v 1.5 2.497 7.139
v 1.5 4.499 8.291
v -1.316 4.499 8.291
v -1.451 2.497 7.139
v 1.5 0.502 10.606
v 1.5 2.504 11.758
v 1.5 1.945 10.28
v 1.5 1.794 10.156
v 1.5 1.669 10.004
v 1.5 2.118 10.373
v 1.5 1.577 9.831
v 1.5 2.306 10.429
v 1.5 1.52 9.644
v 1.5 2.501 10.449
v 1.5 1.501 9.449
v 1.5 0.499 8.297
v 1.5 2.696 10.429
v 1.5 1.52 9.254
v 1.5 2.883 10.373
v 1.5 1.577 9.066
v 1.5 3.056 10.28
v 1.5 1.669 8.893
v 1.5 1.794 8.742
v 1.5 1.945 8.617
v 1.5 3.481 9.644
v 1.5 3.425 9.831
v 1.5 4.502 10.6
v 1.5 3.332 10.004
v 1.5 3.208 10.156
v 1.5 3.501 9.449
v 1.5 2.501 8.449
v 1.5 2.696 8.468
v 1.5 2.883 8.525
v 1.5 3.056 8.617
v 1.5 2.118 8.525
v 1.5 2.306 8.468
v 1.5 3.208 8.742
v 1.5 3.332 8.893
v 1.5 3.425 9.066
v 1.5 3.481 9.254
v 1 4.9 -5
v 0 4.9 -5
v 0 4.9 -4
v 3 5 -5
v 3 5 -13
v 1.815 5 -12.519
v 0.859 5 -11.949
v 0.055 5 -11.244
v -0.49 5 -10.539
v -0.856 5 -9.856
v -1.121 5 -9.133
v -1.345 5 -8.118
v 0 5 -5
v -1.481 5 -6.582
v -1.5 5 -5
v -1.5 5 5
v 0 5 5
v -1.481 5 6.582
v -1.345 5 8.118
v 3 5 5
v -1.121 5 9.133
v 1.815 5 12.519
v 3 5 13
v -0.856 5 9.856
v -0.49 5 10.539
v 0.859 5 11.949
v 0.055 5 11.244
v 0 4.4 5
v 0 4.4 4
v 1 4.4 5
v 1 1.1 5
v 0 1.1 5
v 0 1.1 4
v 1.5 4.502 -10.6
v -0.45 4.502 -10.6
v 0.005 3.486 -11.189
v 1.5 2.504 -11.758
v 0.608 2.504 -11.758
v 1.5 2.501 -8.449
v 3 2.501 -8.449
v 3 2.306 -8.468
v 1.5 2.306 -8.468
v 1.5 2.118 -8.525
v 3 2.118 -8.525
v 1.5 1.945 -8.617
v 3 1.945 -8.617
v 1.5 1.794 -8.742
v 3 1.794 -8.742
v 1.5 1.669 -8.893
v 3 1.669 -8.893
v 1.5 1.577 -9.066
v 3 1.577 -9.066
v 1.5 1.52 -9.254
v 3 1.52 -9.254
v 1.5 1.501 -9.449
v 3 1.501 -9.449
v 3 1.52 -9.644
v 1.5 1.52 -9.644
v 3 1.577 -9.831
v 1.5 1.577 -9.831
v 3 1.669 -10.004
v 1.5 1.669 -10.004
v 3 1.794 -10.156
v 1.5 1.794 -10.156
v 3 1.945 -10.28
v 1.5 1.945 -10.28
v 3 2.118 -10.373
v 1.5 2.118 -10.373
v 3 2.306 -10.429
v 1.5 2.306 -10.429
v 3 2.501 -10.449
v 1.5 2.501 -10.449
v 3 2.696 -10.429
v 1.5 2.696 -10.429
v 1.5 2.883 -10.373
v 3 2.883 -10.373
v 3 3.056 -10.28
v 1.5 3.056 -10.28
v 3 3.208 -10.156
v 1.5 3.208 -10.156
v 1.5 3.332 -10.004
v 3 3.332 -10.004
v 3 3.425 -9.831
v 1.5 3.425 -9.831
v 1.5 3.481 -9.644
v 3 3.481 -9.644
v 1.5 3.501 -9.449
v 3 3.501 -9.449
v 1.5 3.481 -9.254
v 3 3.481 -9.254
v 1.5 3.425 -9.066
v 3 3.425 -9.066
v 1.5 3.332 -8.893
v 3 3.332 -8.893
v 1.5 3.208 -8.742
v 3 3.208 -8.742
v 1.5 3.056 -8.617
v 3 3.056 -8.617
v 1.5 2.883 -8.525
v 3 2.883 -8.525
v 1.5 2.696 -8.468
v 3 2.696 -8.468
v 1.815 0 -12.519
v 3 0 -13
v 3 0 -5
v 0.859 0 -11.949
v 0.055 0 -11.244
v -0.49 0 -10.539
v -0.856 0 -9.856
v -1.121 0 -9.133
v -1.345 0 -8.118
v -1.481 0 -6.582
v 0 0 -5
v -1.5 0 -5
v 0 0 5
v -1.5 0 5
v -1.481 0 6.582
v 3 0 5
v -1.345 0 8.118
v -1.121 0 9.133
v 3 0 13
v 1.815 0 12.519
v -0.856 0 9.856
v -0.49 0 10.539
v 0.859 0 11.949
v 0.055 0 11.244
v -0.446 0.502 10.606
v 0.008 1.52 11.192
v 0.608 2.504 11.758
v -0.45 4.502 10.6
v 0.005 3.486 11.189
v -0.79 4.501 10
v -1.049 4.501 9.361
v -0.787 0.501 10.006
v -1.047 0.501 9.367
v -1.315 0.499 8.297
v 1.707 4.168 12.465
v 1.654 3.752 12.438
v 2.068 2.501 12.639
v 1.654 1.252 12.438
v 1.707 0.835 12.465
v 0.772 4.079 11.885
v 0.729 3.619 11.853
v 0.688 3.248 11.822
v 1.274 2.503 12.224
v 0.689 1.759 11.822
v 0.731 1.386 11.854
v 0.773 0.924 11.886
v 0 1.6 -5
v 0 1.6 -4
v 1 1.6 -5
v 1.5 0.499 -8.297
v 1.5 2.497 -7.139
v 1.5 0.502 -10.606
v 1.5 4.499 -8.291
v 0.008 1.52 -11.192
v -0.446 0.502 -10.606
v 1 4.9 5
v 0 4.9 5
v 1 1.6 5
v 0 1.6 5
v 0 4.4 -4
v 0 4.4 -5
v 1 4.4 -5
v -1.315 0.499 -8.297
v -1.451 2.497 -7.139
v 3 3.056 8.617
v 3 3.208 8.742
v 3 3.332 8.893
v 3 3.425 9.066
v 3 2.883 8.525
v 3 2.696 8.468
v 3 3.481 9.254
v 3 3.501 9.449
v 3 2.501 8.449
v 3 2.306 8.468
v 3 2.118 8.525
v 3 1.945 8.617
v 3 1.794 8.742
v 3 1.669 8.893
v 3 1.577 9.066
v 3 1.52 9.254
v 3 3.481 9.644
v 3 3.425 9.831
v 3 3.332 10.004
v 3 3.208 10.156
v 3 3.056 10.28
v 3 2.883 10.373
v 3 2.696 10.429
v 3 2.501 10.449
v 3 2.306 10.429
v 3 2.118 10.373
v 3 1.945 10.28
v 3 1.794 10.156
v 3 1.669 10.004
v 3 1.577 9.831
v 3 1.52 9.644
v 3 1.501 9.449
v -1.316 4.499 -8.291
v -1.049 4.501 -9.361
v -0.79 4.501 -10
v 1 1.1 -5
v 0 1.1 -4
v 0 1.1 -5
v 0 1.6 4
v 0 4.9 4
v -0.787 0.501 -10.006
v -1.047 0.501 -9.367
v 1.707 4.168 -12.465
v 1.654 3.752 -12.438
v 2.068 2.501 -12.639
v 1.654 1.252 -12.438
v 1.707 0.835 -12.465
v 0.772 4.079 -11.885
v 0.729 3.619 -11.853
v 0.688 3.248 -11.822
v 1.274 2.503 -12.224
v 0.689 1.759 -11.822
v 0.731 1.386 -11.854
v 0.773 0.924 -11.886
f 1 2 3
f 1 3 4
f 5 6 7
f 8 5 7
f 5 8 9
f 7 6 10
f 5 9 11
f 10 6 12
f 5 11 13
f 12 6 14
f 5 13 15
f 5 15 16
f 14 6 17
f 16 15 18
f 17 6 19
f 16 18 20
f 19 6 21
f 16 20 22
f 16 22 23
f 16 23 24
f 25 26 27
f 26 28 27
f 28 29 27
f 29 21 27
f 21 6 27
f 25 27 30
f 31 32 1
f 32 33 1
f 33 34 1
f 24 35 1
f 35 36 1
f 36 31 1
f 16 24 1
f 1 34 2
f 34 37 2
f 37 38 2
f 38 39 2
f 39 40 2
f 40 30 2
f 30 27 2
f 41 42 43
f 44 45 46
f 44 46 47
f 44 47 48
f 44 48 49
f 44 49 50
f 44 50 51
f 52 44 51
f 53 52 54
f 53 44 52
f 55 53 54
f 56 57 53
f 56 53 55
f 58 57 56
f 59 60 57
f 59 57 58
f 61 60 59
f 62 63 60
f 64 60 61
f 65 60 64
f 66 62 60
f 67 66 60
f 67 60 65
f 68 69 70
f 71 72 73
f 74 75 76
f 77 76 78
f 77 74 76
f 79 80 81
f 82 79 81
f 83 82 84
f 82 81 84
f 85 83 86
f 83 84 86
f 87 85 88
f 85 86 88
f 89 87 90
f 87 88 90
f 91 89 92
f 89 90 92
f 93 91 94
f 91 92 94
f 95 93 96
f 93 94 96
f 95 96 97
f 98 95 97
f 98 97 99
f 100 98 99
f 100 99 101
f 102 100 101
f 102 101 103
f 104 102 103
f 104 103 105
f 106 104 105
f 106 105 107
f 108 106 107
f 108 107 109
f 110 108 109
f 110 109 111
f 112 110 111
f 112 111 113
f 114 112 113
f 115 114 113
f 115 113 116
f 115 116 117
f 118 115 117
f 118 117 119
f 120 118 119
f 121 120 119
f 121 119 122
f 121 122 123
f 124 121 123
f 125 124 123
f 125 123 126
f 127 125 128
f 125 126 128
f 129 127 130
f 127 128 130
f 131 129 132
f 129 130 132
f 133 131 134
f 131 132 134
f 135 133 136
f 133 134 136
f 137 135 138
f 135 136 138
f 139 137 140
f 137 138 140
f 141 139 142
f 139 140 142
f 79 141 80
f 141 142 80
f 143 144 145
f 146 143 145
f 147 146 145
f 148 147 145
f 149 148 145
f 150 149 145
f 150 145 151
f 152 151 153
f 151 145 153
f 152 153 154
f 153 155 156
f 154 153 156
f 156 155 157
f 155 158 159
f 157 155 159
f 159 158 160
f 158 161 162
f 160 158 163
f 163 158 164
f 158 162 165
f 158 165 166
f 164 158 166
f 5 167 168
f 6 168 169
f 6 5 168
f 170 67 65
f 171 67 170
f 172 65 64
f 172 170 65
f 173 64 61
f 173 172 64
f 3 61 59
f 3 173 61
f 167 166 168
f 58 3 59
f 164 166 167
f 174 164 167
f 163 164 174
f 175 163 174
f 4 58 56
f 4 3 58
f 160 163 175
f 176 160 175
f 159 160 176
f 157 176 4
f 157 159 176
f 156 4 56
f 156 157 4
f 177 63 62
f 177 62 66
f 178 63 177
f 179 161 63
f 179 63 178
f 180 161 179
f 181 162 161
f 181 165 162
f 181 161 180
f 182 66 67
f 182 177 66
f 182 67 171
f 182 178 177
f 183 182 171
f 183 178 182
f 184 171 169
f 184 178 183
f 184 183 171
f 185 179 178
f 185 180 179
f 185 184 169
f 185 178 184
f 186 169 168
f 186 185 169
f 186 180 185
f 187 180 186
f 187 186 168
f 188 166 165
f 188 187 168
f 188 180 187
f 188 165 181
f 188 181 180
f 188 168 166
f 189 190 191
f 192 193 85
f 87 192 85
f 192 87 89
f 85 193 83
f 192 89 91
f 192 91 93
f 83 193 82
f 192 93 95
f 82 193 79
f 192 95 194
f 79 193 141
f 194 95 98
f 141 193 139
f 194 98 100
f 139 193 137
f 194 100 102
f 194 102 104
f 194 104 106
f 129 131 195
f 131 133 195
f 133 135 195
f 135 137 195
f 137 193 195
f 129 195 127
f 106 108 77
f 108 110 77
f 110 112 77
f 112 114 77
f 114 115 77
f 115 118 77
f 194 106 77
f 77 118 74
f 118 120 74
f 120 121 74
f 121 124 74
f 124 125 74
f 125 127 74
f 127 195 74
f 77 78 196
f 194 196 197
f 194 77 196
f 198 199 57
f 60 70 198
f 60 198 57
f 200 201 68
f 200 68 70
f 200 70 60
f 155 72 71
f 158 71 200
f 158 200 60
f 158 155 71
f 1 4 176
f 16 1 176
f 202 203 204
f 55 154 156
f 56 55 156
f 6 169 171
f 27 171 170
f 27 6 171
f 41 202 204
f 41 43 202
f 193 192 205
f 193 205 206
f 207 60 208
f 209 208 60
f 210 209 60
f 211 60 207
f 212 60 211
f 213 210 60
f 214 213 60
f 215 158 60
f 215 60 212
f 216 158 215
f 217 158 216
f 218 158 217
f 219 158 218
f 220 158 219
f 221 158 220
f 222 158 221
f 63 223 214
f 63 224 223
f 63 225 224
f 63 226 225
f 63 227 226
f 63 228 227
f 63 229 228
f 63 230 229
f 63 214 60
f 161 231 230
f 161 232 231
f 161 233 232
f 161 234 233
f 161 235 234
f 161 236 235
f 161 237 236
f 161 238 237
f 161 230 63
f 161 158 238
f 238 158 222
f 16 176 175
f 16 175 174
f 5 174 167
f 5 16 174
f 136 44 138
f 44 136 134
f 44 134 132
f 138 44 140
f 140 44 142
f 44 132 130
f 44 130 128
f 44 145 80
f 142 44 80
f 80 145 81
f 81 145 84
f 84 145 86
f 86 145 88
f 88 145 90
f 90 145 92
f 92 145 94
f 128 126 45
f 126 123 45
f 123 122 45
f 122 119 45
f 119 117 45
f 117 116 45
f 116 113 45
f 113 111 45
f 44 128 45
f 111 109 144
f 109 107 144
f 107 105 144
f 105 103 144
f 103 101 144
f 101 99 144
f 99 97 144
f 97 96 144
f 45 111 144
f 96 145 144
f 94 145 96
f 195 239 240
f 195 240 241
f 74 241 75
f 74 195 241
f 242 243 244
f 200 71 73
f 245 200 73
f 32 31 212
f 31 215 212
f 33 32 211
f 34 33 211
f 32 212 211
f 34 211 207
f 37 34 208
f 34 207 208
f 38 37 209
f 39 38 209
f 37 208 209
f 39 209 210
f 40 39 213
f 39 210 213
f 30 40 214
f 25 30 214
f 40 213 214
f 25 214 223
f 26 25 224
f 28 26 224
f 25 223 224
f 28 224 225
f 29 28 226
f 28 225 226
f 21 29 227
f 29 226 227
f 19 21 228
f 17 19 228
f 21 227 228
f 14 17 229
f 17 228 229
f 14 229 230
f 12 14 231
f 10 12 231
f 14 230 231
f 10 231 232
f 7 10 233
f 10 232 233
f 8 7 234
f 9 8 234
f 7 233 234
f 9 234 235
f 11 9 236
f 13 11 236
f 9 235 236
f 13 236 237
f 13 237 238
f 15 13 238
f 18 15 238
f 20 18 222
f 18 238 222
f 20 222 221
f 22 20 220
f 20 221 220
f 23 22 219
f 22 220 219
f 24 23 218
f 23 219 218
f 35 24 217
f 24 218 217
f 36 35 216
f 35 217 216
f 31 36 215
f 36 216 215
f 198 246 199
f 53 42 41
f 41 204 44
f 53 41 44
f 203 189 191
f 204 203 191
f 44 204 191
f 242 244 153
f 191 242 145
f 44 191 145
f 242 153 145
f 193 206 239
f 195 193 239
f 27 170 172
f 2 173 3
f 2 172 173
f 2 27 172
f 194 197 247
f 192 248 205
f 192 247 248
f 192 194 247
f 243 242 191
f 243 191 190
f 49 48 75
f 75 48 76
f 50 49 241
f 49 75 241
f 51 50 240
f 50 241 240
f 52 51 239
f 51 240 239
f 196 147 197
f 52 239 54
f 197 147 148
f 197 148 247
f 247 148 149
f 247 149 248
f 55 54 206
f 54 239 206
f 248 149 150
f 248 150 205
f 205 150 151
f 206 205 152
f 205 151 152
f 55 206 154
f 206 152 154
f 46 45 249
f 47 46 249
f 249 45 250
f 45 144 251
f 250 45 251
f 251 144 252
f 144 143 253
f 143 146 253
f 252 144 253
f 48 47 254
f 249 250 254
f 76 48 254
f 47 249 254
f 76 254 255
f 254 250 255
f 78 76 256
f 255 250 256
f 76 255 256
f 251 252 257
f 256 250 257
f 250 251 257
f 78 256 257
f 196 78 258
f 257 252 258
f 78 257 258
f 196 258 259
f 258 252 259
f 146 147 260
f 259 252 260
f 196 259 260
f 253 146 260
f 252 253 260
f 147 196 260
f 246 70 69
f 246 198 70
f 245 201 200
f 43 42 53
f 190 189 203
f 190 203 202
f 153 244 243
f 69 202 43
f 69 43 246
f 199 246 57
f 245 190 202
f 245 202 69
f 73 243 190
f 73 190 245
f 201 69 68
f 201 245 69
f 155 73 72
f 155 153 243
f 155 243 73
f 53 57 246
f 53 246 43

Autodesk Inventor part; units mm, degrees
sketch "Sketch1" plane through (0, 0, 0) normal (0, 1, 0) x (-1, 0, 0)
  line L0 (0, 0) -> (0, -5)
  line L1 (0, 0) -> (0, 5)
  line L2 (0, 5) -> (-3, 5)
  line L3 (0, -5) -> (-3, -5)
  line L4 (-3, 5) -> (-3, 13)
  line L5 (-3, -5) -> (-3, -13)
  line L6 (1.5, 0) -> (1.5, -5)
  line L7 (1.5, 0) -> (1.5, 5)
  spline S0 degree 3 poles (-3, 13) (1.5, 11.5121) (1.5, 8.2561) (1.5, 5) knots 0 0 0 0 1 1 1 1
  spline S1 degree 3 poles (-3, -13) (1.5, -11.5121) (1.5, -8.2561) (1.5, -5) knots 0 0 0 0 1 1 1 1
  point P0 (-3, 9)
  point P1 (-3, -9)
  dimension "d0" = 5
  dimension "d1" = 5
  dimension "d2" = 3
  dimension "d3" = 3
  dimension "d4" = 8
  dimension "d5" = 8
  dimension "d6" = 5
  dimension "d7" = 5
extrude "Extrusion1" add sketch "Sketch1" along normal blind 5
sketch "Sketch2" plane through (3, 0, 13) normal (1, 0, 0) x (0, 0, -1)
  circle A0 centre (3.5513, 2.5007) radius 1
  line L0 (13, 0) -> (13, 5)
  line L1 (8, 5) -> (18, 5) projected
  line L2 (4.7093, 4.4988) -> (5.8606, 2.4969)
  line L3 (5.8606, 2.4969) -> (4.7026, 0.4988)
  line L4 (4.7026, 0.4988) -> (2.3933, 0.5026)
  line L5 (2.3933, 0.5026) -> (1.2419, 2.5045)
  line L6 (1.2419, 2.5045) -> (2.3999, 4.5026)
  line L7 (2.3999, 4.5026) -> (4.7093, 4.4988)
  point P0 (22, 2.5)
  dimension "d12" = 2
  dimension "d33" = 4
extrude "Extrusion2" cut sketch "Sketch2" against normal blind 2 contours A0
ref_plane "Work Plane3" through (1.5, 0, 13) normal (1, 0, 0) x (0, 0, -1)
sketch "Sketch3" plane through (1.5, 0, 13) normal (1, 0, 0) x (0, 0, -1)
  circle A0 centre (3.5513, 2.5007) radius 1 projected
  circle A1 centre (3.5513, 2.5007) radius 1 projected
  line L0 (0, 0) -> (8, 0) projected
  line L1 (8, 0) -> (8, 5) projected
  line L2 (0, 5) -> (8, 5) projected
  line L3 (0, 0) -> (0, 5) projected
  line L4 (2.3935, 0.5024) -> (1.2419, 2.5042) projected
  line L5 (1.2419, 2.5042) -> (2.3996, 4.5024) projected
  line L6 (2.3996, 4.5024) -> (4.709, 4.4989) projected
  line L7 (4.709, 4.4989) -> (5.8607, 2.4972) projected
  line L8 (5.8607, 2.4972) -> (4.7029, 0.4989) projected
  line L9 (4.7029, 0.4989) -> (2.3935, 0.5024) projected
  circle A2 centre (3.5513, 2.5007) radius 1 projected
  point P0 (13, 0)
extrude "Extrusion3" cut sketch "Sketch3" against normal blind 10 contours A0 | L4 L5 L6 L7 L8 L9
ref_plane "Work Plane5" through (3, 0, 0) normal (0, 0, 1) x (0, 1, 0)
mirror "Mirror1" about plane through (3, 0, 0) normal (0, 0, 1) of "Extrusion2", "Extrusion3"
ref_plane "Work Plane6" through (0, 1.1, 0) normal (0, -1, 0) x (1, 0, 0)
sketch "Sketch5" plane through (0, 1.1, 0) normal (0, -1, 0) x (1, 0, 0)
  line L0 (3, 5) -> (0, 5) projected
  line L1 (0, 5) -> (0, -5) projected
  line L2 (1, 5) -> (0, 4)
  line L3 (0, -5) -> (3, -5) projected
  line L4 (1, -5) -> (0, -4)
  point P0 (0, 0)
extrude "Extrusion4" add sketch "Sketch5" against normal blind 0.5
ref_plane "Work Plane7" through (0, 4.9, 0) normal (0, 1, 0) x (1, 0, 0)
sketch "Sketch6" plane through (0, 4.9, 0) normal (0, 1, 0) x (1, 0, 0)
  line L0 (1, -5) -> (0, -5) projected
  line L1 (1, -5) -> (0, -4) projected
  line L2 (0, -5) -> (0, -4) projected
  line L3 (0, 4) -> (0, 5) projected
  line L4 (0, 4) -> (1, 5) projected
  line L5 (0, 5) -> (1, 5) projected
  point P0 (0, 0)
extrude "Extrusion5" add sketch "Sketch6" against normal blind 0.5
properties part number "top_mount"
